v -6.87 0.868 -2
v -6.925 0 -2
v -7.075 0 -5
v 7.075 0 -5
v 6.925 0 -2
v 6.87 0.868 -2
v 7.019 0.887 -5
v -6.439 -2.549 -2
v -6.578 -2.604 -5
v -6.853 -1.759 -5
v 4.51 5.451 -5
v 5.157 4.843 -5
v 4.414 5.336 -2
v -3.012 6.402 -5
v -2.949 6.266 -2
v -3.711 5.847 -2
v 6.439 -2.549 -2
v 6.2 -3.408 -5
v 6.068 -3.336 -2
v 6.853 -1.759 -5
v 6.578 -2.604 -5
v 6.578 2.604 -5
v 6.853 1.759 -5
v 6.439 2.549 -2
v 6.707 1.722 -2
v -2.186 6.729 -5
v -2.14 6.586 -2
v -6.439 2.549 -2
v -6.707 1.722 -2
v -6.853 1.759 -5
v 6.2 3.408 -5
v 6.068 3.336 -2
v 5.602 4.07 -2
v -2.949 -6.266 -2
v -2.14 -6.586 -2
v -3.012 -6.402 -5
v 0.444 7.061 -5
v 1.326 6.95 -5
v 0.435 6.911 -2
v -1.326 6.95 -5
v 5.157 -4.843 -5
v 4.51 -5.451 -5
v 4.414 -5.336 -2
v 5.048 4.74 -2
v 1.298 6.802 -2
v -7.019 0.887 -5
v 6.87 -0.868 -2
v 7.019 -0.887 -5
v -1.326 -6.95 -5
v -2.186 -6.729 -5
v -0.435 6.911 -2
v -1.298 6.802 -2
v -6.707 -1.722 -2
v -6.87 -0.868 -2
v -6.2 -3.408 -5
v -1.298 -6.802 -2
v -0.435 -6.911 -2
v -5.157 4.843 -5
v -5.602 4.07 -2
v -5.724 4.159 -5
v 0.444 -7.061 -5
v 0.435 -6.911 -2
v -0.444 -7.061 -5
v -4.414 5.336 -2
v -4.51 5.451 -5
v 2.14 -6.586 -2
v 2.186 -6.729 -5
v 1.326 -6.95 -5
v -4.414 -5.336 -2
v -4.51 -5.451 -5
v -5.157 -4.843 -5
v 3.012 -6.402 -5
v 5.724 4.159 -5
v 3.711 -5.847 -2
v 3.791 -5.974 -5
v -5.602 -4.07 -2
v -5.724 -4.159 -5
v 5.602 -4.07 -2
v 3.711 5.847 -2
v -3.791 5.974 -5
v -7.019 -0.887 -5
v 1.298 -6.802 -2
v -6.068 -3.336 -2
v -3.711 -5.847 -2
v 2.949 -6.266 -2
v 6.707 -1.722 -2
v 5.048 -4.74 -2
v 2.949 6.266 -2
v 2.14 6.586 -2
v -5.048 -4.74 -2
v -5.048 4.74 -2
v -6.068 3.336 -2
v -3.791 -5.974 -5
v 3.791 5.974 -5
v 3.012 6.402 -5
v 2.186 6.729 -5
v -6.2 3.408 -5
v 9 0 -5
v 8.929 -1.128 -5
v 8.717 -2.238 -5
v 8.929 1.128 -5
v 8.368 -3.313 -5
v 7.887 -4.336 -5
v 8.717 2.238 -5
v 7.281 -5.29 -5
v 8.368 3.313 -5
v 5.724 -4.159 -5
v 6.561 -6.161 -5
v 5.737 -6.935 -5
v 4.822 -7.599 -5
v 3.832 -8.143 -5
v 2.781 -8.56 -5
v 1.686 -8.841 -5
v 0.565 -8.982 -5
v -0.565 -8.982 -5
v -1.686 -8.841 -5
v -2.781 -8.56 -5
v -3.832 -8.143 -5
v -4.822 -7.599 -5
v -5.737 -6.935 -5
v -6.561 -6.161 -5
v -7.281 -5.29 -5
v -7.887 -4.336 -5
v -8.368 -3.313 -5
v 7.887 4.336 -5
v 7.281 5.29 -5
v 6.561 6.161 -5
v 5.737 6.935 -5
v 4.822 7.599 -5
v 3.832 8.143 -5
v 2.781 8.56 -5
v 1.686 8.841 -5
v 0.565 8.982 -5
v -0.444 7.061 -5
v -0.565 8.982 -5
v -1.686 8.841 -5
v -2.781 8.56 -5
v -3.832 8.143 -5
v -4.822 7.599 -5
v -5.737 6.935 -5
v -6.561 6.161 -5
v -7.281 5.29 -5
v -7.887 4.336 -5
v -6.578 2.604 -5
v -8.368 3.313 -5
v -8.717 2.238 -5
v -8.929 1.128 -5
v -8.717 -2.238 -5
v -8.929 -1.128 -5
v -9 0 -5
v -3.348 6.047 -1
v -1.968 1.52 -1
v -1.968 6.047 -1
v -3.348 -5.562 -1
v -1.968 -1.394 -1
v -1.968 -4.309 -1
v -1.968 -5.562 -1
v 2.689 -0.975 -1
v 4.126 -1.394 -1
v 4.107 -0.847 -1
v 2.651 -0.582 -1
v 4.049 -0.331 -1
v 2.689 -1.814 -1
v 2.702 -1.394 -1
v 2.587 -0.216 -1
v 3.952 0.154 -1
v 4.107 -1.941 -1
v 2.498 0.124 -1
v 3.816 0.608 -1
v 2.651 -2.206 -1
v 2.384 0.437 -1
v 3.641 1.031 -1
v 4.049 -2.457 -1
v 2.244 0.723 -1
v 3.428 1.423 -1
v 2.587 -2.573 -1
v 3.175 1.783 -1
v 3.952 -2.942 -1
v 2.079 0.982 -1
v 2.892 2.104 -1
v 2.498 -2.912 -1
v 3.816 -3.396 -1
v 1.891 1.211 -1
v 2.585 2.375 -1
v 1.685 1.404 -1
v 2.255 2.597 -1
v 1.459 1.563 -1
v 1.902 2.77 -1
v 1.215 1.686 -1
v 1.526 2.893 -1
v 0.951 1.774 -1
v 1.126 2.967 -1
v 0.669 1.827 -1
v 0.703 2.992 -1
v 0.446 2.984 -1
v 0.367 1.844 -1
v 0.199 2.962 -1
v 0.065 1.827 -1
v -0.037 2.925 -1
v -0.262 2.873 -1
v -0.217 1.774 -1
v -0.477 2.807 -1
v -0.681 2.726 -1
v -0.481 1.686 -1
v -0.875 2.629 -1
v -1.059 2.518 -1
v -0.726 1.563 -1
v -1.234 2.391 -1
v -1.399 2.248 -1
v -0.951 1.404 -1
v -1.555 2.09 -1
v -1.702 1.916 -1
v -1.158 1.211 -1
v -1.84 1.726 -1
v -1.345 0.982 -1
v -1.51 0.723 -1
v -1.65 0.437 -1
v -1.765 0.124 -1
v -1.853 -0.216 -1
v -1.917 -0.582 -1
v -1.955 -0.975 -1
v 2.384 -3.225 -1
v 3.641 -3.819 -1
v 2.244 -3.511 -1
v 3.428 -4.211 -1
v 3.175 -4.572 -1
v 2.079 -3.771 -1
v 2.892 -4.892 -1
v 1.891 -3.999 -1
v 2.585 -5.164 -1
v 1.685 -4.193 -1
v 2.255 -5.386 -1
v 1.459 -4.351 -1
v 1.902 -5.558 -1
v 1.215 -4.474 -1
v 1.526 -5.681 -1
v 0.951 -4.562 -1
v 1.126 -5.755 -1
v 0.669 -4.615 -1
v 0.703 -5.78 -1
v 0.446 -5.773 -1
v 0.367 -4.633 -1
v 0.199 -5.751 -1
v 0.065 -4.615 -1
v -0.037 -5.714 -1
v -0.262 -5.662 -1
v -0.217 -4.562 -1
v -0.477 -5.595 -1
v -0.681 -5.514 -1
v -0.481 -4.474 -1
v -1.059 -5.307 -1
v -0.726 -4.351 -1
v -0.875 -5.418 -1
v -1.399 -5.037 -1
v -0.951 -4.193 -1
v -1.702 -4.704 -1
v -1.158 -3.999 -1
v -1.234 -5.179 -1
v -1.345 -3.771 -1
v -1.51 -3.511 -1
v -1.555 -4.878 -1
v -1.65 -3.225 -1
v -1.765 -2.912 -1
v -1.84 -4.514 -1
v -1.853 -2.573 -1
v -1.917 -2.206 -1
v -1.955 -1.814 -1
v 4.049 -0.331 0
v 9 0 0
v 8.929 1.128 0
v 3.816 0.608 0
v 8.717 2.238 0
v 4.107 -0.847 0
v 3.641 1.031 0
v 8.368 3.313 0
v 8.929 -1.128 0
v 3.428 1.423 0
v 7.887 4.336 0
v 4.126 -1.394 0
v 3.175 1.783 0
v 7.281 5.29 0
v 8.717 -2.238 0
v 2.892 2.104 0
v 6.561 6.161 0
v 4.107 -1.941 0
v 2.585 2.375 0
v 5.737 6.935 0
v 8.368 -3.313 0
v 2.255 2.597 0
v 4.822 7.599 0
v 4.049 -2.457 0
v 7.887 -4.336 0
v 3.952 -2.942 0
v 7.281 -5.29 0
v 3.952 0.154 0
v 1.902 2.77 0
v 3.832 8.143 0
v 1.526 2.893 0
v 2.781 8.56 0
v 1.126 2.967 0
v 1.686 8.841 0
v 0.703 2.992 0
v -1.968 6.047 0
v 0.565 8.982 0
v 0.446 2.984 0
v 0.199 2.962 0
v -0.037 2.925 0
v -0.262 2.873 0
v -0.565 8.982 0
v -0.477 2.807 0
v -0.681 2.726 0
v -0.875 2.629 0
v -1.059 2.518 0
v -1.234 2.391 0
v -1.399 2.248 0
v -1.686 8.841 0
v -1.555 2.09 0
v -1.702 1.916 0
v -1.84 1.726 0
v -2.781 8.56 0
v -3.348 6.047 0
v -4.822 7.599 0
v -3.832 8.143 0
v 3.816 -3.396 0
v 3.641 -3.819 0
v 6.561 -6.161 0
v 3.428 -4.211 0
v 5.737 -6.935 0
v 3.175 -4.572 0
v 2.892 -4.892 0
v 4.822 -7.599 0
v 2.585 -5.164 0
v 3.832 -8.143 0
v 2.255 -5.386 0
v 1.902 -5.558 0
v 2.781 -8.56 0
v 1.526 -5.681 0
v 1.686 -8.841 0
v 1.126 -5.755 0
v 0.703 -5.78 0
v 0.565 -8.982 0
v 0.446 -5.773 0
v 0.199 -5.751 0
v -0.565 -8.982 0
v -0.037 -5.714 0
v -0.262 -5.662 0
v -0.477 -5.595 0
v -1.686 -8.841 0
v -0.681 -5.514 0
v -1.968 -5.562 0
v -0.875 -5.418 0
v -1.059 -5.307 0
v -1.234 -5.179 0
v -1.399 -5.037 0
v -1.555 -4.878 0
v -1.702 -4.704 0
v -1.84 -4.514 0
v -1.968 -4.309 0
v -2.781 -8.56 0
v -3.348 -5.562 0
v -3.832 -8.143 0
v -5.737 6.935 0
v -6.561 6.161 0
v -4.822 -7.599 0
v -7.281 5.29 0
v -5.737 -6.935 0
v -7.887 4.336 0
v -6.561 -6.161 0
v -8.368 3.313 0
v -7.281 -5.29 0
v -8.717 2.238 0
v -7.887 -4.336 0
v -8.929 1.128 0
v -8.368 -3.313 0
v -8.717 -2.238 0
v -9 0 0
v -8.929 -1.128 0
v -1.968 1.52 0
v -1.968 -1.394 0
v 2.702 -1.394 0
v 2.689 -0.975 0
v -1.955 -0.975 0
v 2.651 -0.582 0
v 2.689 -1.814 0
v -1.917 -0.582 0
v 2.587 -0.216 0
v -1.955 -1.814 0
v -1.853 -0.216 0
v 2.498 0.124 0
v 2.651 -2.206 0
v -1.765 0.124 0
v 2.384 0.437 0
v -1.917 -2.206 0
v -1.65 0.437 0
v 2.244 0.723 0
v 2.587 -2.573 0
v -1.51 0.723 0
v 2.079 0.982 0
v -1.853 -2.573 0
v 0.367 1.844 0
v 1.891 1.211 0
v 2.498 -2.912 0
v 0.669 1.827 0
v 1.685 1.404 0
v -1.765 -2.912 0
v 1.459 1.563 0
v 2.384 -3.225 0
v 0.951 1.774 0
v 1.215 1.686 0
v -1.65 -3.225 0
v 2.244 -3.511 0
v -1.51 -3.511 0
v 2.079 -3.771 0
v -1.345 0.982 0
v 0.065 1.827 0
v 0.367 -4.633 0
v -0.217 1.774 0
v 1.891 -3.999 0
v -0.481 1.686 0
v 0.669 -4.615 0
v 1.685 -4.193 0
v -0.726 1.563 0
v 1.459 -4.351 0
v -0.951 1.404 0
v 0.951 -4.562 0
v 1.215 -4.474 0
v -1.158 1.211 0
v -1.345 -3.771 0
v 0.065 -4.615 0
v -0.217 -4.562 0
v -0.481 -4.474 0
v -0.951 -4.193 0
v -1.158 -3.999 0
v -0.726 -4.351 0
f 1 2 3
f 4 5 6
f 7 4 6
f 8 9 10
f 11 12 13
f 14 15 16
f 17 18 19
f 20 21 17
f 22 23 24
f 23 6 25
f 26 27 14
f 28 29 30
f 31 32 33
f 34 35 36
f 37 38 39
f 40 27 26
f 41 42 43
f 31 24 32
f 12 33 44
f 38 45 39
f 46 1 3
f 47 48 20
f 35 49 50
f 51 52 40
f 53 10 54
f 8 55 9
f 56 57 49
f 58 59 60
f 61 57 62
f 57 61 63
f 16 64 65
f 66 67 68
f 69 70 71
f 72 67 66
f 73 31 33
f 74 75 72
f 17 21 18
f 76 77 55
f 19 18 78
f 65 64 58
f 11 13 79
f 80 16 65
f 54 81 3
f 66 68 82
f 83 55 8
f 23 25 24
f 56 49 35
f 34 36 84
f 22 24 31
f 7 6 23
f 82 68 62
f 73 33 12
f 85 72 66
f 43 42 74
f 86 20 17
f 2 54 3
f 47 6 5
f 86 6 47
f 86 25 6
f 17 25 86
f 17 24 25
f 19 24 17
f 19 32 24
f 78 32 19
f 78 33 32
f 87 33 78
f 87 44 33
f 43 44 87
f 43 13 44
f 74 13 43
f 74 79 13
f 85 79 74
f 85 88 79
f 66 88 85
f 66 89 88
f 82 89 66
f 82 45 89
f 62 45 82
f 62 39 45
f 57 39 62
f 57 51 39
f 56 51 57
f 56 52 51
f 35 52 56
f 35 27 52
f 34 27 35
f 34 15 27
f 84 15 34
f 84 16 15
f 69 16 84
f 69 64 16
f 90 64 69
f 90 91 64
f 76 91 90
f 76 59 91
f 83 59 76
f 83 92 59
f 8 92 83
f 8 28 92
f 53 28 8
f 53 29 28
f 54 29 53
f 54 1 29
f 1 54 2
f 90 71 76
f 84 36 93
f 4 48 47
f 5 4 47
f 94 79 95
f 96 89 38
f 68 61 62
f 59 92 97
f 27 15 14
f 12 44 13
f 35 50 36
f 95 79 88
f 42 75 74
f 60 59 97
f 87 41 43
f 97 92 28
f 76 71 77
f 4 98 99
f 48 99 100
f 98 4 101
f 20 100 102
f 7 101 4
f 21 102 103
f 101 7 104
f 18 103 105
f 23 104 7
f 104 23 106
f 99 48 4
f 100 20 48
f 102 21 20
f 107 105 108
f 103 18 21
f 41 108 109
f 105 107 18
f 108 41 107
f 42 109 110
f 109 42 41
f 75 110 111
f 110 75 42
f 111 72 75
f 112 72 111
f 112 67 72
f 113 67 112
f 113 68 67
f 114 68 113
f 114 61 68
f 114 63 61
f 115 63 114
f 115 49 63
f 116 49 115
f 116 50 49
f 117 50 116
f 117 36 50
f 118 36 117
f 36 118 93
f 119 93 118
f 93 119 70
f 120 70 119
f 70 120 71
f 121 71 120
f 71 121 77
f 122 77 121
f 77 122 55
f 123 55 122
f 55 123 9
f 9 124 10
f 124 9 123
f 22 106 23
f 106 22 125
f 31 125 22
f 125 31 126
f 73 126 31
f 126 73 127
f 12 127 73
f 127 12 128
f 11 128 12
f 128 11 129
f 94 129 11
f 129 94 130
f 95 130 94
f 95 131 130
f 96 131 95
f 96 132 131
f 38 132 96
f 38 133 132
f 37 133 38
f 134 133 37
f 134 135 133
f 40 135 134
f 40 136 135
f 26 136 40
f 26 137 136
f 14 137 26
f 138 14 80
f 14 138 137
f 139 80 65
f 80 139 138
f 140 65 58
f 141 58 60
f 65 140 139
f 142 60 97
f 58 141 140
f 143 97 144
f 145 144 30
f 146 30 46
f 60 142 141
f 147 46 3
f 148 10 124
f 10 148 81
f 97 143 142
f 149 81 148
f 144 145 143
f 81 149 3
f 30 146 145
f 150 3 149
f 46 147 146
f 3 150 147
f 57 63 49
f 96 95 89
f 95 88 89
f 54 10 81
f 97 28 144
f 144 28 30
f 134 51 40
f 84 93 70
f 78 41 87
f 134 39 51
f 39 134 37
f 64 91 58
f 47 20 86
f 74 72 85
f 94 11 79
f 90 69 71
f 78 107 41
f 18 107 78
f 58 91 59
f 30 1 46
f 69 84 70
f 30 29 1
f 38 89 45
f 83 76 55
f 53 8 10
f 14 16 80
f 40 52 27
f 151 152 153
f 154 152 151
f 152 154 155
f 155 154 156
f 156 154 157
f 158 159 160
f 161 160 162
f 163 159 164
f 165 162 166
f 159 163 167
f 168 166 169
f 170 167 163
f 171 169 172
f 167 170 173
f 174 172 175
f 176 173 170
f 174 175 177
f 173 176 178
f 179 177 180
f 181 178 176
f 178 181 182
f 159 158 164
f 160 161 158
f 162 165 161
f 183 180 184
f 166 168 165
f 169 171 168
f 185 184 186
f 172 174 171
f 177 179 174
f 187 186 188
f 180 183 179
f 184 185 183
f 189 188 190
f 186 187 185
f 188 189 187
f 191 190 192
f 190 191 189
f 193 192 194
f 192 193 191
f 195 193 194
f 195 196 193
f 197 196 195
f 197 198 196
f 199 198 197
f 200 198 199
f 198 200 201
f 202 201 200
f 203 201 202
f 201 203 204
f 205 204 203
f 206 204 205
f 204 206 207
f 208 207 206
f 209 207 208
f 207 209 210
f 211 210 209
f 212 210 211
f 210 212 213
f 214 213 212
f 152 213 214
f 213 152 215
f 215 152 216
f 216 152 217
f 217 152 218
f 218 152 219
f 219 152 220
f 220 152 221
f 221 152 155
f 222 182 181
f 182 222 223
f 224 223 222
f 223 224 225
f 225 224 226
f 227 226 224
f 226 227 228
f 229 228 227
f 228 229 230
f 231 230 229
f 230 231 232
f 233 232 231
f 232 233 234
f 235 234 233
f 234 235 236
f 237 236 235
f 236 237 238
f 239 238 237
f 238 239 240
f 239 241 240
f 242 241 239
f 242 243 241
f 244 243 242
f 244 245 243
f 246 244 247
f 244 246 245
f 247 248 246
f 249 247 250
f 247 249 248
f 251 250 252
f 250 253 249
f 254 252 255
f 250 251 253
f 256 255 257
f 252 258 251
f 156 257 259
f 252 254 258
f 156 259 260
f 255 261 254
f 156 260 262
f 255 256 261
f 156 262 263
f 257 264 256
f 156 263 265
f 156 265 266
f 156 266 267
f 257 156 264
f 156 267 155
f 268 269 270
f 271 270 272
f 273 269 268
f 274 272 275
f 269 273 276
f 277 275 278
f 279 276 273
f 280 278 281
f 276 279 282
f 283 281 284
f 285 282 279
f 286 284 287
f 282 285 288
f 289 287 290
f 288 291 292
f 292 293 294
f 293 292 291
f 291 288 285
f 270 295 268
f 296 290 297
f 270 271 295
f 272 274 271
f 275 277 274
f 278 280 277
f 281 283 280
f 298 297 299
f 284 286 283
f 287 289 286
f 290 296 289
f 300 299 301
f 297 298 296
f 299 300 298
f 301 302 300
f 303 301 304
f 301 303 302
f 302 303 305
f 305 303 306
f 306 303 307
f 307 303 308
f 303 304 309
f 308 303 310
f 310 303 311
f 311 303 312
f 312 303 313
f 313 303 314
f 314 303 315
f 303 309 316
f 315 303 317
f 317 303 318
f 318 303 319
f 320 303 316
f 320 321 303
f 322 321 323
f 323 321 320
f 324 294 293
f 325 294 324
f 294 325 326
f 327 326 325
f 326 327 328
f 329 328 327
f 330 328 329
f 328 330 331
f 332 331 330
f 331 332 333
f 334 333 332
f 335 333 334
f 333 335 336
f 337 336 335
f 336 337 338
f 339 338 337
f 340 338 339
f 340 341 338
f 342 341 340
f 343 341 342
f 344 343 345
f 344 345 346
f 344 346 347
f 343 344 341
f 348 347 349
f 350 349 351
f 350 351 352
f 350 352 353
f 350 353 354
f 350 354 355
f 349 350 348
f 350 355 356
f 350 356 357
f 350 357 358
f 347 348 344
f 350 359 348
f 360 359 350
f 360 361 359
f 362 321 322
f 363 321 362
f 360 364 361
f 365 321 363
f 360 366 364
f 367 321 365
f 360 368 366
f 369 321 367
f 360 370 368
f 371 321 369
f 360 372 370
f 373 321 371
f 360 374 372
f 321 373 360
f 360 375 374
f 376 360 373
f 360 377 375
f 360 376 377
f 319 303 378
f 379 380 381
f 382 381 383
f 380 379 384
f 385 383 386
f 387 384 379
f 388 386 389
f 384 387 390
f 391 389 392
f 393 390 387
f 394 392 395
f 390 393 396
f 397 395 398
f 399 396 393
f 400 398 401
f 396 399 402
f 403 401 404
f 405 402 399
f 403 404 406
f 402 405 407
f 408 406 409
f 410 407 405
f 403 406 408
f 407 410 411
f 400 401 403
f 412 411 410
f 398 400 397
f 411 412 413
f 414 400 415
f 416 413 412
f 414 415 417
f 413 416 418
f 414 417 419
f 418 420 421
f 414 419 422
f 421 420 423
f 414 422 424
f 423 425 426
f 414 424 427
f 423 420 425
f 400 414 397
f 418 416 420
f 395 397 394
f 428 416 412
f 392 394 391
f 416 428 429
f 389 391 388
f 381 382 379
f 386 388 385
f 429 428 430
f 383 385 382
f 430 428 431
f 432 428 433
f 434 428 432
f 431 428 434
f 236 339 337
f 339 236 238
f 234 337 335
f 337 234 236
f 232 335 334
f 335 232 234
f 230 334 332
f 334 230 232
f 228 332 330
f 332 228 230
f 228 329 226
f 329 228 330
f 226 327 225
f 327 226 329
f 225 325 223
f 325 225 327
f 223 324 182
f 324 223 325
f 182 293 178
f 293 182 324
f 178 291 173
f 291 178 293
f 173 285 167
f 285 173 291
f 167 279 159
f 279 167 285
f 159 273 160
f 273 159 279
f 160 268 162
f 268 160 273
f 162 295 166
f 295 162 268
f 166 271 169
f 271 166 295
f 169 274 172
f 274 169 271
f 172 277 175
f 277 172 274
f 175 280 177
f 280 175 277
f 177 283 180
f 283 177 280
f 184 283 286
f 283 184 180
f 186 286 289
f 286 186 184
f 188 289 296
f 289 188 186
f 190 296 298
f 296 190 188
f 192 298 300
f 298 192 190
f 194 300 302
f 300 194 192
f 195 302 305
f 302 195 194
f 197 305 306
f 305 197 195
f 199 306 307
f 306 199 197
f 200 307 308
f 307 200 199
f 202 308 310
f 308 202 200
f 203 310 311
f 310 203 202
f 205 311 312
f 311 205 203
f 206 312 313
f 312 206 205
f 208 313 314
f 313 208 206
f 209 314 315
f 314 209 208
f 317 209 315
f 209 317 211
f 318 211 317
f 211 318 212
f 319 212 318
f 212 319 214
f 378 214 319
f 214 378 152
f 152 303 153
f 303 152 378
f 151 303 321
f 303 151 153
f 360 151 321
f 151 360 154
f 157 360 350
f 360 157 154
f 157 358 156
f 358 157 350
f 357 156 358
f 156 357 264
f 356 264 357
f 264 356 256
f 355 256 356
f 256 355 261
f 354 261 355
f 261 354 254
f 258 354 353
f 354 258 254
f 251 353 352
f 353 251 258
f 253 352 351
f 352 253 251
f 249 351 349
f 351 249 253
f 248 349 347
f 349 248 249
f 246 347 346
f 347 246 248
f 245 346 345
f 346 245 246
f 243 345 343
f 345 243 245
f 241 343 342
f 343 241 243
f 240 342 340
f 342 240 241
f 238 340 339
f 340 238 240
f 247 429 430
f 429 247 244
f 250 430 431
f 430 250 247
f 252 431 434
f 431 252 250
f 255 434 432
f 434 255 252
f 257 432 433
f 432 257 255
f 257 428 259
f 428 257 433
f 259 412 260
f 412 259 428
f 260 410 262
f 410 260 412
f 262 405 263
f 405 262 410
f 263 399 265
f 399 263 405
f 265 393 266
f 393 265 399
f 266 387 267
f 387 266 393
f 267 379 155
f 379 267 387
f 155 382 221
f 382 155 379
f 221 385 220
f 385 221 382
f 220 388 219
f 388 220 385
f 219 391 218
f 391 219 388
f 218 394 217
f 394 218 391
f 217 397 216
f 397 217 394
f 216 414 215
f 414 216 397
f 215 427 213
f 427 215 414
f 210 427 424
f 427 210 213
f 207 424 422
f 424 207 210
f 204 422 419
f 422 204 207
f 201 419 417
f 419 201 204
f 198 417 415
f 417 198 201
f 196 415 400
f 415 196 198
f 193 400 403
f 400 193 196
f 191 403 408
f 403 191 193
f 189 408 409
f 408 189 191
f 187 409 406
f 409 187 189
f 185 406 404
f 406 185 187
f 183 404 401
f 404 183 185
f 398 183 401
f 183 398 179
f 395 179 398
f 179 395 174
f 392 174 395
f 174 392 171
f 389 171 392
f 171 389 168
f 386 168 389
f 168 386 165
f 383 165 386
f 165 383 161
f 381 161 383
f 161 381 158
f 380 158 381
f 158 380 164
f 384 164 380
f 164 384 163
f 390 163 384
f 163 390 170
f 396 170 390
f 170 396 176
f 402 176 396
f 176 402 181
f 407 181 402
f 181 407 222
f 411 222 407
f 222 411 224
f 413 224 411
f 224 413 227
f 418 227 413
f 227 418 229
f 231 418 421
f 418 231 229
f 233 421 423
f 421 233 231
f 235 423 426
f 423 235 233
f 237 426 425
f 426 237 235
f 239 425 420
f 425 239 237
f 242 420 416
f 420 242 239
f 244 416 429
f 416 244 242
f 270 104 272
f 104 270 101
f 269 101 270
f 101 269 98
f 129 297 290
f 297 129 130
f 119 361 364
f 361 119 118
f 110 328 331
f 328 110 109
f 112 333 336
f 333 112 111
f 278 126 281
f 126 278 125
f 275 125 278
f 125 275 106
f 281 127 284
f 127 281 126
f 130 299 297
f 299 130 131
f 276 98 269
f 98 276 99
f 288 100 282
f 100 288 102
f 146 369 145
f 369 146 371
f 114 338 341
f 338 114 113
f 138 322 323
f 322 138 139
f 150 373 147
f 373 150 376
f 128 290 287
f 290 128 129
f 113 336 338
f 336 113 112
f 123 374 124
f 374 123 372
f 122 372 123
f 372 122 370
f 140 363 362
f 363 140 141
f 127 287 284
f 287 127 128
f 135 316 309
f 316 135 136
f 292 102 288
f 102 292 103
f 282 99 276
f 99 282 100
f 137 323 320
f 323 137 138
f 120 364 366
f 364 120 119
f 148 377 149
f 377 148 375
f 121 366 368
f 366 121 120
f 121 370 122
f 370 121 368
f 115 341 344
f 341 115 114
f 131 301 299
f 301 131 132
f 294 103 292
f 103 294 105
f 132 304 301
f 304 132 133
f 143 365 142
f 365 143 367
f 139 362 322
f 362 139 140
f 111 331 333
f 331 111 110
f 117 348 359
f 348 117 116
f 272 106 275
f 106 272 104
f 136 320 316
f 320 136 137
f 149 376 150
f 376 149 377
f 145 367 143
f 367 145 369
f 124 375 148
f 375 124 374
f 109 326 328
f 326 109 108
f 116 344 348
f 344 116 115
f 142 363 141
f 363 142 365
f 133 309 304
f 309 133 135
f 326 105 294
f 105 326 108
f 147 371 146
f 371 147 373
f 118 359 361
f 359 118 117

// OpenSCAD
$fn = 50;


difference() {
	union() {
		translate(v = [0, 0, -5.0000000000]) {
			cylinder(h = 5, r = 9.0000000000);
		}
	}
	union() {
		#translate(v = [0, 0, -5.0000000000]) {
			cylinder(h = 3, r1 = 7.0750000000, r2 = 6.9250000000);
		}
		translate(v = [0, 0, -1]) {
			linear_extrude(height = 1) {
				text(font = "Webdings", halign = "center", size = 11, text = "b", valign = "center");
			}
		}
	}
}
